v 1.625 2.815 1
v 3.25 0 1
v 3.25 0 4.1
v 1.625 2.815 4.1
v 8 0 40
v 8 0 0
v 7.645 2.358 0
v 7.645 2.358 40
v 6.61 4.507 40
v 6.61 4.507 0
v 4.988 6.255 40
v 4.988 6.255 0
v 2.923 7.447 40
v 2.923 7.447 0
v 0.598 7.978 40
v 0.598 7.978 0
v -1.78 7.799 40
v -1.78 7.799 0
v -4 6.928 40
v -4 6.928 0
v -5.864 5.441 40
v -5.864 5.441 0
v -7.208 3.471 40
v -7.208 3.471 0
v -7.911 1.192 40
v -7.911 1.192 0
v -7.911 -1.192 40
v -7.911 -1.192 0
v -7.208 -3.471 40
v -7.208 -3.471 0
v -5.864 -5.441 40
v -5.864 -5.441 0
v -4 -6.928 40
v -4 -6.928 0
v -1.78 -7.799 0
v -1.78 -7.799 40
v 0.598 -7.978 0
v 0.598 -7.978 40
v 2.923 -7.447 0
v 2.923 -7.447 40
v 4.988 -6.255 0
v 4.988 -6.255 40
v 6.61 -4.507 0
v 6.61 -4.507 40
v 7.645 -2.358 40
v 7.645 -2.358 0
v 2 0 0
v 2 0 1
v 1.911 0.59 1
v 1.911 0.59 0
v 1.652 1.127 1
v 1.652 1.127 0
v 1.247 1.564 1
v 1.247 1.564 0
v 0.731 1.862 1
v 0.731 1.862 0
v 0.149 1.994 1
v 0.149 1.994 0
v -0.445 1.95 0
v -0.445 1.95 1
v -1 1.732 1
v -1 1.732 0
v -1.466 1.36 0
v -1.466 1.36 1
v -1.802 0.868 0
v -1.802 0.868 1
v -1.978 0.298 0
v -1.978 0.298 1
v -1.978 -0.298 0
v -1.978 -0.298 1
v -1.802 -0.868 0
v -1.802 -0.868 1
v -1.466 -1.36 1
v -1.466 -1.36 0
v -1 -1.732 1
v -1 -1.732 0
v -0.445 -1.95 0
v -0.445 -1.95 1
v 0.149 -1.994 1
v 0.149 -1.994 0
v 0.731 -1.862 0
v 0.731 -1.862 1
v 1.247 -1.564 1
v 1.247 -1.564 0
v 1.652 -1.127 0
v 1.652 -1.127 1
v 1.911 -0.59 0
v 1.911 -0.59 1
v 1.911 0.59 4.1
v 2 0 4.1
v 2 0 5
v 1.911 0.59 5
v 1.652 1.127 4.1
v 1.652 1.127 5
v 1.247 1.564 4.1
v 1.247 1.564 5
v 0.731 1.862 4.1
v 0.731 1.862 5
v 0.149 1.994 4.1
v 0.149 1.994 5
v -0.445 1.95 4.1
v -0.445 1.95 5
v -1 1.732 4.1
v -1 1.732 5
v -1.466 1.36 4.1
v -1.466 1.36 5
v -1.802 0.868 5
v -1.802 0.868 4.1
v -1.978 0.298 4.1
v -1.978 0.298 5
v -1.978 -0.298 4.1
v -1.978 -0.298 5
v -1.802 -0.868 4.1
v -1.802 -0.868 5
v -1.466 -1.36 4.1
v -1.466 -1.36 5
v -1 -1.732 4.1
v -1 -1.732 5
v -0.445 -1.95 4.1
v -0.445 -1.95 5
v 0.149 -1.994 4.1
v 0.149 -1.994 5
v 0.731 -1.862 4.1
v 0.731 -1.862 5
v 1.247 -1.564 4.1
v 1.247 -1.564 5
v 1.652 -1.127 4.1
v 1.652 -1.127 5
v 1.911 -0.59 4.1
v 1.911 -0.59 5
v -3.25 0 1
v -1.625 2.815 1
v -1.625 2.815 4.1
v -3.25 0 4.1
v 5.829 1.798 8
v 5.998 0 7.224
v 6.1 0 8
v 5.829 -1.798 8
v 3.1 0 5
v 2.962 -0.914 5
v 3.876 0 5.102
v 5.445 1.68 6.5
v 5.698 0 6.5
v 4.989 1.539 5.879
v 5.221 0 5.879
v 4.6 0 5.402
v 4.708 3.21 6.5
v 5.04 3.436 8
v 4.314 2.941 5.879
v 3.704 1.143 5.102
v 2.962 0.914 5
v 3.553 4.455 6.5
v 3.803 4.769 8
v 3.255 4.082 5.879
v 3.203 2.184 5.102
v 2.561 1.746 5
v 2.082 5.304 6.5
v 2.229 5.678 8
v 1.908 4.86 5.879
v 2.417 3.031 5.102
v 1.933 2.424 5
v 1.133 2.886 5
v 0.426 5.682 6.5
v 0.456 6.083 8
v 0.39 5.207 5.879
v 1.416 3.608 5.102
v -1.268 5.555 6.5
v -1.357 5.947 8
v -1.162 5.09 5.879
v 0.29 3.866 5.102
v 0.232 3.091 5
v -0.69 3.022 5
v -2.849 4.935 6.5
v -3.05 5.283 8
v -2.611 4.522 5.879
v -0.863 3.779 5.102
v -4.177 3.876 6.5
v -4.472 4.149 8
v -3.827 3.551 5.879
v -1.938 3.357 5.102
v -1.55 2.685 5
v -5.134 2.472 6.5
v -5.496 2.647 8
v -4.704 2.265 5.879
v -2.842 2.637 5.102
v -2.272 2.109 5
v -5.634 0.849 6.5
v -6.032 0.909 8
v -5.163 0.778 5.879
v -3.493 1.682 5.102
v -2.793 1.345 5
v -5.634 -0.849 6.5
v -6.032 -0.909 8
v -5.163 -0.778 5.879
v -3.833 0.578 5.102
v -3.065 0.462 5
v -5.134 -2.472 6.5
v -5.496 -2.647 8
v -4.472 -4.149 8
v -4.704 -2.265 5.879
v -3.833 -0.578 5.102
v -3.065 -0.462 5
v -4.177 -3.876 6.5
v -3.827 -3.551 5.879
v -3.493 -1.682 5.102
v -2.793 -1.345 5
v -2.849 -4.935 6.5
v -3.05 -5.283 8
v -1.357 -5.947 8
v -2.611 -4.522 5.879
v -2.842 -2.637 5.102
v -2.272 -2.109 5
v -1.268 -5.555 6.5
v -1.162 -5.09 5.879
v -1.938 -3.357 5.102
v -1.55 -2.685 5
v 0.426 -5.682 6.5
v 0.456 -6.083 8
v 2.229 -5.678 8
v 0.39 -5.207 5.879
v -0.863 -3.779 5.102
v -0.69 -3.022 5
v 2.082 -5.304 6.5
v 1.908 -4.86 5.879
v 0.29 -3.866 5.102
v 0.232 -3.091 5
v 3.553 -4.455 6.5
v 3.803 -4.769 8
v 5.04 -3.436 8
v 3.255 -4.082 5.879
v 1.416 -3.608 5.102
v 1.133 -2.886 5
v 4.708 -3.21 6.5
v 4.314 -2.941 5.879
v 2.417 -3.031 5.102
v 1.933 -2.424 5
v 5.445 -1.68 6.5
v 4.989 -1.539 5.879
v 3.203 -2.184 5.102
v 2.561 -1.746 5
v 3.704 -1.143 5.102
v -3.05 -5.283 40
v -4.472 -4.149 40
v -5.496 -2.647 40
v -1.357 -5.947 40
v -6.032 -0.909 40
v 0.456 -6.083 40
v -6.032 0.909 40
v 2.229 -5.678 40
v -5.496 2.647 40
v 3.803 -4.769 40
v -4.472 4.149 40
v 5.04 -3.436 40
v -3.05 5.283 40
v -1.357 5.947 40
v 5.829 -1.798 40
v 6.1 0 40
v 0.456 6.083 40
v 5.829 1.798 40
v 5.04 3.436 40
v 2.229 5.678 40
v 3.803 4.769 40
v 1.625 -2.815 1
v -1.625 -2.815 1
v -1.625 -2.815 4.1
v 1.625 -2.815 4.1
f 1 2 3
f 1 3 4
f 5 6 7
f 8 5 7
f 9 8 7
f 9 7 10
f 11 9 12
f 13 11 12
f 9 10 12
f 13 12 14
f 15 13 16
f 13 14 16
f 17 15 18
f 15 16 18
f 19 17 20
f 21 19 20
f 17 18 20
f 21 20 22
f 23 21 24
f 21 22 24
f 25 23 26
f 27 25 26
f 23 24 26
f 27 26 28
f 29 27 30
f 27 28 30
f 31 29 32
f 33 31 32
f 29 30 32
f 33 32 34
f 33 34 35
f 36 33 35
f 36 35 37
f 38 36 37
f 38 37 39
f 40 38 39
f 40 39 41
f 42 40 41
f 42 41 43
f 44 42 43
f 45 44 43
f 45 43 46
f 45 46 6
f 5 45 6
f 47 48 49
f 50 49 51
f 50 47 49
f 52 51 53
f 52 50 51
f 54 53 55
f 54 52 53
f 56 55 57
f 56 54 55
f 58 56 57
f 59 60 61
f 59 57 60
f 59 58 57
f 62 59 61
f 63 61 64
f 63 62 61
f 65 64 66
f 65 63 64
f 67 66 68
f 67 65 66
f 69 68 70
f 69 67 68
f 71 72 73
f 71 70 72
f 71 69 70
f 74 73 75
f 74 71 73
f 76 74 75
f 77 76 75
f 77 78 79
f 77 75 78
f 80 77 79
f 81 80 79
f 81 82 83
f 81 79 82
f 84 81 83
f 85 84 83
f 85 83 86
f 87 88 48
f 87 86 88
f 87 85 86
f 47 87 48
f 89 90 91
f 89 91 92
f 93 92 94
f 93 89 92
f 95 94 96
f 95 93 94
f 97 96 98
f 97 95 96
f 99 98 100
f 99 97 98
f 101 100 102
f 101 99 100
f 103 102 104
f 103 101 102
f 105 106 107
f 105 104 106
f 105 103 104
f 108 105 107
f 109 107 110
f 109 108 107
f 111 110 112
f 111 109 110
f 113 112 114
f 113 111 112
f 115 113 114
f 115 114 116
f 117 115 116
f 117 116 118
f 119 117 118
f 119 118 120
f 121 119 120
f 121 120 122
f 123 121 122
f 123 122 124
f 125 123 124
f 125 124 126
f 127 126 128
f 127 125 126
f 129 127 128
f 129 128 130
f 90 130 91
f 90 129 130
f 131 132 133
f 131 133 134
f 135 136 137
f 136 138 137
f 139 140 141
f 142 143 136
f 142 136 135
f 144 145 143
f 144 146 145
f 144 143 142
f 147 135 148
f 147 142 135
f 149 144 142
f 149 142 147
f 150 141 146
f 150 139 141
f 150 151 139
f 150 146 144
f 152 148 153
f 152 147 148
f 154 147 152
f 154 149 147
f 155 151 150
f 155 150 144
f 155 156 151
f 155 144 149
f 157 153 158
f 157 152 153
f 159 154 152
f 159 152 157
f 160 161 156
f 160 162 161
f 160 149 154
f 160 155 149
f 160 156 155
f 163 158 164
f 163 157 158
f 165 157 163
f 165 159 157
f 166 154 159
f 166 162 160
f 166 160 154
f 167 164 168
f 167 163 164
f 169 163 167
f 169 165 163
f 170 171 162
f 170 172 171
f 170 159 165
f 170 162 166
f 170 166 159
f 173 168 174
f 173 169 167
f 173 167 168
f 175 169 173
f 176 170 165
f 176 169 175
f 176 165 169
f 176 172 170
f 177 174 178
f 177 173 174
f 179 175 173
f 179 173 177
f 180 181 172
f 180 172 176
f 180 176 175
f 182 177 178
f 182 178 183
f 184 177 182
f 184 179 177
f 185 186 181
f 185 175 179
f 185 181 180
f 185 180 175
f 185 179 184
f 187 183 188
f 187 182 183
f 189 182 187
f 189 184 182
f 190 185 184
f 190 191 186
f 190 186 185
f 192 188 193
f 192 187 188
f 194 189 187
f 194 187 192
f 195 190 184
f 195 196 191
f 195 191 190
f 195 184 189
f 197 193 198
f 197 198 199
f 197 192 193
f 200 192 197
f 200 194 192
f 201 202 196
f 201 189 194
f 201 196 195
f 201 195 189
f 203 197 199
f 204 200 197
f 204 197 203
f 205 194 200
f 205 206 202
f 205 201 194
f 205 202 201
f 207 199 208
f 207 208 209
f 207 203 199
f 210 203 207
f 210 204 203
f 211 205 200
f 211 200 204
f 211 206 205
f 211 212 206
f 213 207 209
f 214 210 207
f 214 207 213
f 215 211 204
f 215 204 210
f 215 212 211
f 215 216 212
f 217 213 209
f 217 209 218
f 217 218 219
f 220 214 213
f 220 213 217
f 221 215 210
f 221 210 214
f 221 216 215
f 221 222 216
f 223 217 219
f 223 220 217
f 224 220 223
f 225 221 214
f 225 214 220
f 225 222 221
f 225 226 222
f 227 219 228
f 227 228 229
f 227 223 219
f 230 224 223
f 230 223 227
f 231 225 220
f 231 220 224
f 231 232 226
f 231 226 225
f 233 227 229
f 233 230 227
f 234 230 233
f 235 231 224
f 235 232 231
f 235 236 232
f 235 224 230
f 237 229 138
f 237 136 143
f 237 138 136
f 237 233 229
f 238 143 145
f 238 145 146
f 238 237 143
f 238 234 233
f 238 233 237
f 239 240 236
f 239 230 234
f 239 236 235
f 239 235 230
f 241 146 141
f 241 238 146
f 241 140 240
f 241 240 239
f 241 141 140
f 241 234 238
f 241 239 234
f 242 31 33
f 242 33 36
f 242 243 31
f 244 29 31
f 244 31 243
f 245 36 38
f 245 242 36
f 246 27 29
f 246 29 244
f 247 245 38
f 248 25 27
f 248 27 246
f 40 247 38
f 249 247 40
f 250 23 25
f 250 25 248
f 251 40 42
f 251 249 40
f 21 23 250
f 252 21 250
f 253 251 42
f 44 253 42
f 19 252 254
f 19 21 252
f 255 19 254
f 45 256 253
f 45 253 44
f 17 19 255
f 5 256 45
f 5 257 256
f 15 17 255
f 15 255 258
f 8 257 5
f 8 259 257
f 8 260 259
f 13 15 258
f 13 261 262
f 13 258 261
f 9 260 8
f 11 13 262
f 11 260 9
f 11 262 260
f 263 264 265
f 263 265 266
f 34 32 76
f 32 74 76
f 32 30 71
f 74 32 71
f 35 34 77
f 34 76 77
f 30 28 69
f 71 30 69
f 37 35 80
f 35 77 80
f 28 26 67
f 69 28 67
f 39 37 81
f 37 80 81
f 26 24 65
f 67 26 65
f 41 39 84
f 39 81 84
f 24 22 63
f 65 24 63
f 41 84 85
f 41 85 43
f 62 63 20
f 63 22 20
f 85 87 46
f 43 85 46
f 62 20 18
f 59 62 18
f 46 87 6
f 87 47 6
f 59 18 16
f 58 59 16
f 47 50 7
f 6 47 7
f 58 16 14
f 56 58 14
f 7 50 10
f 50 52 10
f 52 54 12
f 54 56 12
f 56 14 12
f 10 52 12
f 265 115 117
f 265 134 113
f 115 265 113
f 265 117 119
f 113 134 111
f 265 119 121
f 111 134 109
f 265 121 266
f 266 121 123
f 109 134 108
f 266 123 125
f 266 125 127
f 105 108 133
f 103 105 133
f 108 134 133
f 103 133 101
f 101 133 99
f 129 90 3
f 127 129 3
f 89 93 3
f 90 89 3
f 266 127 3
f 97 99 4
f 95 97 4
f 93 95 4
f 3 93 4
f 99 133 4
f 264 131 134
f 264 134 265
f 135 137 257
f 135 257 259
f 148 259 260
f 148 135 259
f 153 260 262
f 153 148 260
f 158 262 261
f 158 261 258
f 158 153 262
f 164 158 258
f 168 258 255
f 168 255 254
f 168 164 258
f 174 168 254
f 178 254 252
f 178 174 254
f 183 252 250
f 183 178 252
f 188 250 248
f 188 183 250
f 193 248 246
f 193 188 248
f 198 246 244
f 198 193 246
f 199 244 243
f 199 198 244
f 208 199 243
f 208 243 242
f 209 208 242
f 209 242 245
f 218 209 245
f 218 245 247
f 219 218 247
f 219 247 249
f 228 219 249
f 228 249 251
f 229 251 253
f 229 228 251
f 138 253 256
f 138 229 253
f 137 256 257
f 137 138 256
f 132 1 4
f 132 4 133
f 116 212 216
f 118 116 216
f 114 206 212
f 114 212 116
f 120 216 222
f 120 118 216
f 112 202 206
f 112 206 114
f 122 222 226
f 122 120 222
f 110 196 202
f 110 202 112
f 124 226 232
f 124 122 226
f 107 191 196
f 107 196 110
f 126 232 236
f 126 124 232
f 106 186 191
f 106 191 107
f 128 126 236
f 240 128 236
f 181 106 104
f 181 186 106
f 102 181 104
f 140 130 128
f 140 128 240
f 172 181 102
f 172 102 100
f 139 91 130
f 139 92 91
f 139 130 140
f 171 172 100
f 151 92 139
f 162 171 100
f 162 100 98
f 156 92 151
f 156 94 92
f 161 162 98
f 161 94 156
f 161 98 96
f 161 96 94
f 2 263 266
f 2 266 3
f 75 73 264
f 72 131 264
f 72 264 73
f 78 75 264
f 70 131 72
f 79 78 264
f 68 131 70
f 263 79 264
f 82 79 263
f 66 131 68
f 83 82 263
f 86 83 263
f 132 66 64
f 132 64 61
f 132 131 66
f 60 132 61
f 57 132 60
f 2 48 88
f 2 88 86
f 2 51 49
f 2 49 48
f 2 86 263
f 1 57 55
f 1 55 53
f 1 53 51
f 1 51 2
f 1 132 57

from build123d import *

# Parameters (mm, degrees)
PRISM_DEPTH       = 3.1
CYLINDER021_R     = 2
CYLINDER021_DEPTH = 10
CYLINDER020_R     = 8
CYLINDER020_DEPTH = 5
CYLINDER023_R     = 6.1
CYLINDER023_DEPTH = 35
CYLINDER022_R     = 8
CYLINDER022_DEPTH = 35
FILLET_R          = 3


with BuildPart() as prism:
    # Prism → Prism (new body)
    with BuildSketch(Plane.XY.offset(1)):
        Polygon((3.25, 0), (1.625, 2.814583), (-1.625, 2.814583), (-3.25, 0), (-1.625, -2.814583), (1.625, -2.814583), align=None)
    extrude(amount=PRISM_DEPTH)


with BuildPart() as cylinder021:
    # Cylinder021 → Cylinder021 (new body)
    with BuildSketch(Plane.XY):
        Circle(CYLINDER021_R)
    extrude(amount=CYLINDER021_DEPTH)


with BuildPart() as cut017:
    # Cylinder020 → Cylinder020 (new body)
    with BuildSketch(Plane.XY):
        Circle(CYLINDER020_R)
    extrude(amount=CYLINDER020_DEPTH)

    # Cut015: cut Cylinder021
    add(cylinder021.part, mode=Mode.SUBTRACT)

    # Cut017: cut Prism
    add(prism.part, mode=Mode.SUBTRACT)


with BuildPart() as cylinder023:
    # Cylinder023 → Cylinder023 (new body)
    with BuildSketch(Plane.XY):
        Circle(CYLINDER023_R)
    extrude(amount=CYLINDER023_DEPTH)


with BuildPart() as fillet_body:
    # Cylinder022 → Cylinder022 (new body)
    with BuildSketch(Plane.XY):
        Circle(CYLINDER022_R)
    extrude(amount=CYLINDER022_DEPTH)

    # Cut016: cut Cylinder023
    add(cylinder023.part, mode=Mode.SUBTRACT)


with BuildPart() as fillet_body_1:
    # Cut016 placement: moved
    add(fillet_body.part.moved(Location((0, 0, 5))))

    # Fusion010: union Cut017
    add(cut017.part)

    # Fillet
    fillet_edges = [fillet_body_1.edges().sort_by_distance(p)[0] for p in [
        (-6.1, 0, 5),
    ]]
    fillet(fillet_edges, radius=FILLET_R)


solid = fillet_body_1.part
